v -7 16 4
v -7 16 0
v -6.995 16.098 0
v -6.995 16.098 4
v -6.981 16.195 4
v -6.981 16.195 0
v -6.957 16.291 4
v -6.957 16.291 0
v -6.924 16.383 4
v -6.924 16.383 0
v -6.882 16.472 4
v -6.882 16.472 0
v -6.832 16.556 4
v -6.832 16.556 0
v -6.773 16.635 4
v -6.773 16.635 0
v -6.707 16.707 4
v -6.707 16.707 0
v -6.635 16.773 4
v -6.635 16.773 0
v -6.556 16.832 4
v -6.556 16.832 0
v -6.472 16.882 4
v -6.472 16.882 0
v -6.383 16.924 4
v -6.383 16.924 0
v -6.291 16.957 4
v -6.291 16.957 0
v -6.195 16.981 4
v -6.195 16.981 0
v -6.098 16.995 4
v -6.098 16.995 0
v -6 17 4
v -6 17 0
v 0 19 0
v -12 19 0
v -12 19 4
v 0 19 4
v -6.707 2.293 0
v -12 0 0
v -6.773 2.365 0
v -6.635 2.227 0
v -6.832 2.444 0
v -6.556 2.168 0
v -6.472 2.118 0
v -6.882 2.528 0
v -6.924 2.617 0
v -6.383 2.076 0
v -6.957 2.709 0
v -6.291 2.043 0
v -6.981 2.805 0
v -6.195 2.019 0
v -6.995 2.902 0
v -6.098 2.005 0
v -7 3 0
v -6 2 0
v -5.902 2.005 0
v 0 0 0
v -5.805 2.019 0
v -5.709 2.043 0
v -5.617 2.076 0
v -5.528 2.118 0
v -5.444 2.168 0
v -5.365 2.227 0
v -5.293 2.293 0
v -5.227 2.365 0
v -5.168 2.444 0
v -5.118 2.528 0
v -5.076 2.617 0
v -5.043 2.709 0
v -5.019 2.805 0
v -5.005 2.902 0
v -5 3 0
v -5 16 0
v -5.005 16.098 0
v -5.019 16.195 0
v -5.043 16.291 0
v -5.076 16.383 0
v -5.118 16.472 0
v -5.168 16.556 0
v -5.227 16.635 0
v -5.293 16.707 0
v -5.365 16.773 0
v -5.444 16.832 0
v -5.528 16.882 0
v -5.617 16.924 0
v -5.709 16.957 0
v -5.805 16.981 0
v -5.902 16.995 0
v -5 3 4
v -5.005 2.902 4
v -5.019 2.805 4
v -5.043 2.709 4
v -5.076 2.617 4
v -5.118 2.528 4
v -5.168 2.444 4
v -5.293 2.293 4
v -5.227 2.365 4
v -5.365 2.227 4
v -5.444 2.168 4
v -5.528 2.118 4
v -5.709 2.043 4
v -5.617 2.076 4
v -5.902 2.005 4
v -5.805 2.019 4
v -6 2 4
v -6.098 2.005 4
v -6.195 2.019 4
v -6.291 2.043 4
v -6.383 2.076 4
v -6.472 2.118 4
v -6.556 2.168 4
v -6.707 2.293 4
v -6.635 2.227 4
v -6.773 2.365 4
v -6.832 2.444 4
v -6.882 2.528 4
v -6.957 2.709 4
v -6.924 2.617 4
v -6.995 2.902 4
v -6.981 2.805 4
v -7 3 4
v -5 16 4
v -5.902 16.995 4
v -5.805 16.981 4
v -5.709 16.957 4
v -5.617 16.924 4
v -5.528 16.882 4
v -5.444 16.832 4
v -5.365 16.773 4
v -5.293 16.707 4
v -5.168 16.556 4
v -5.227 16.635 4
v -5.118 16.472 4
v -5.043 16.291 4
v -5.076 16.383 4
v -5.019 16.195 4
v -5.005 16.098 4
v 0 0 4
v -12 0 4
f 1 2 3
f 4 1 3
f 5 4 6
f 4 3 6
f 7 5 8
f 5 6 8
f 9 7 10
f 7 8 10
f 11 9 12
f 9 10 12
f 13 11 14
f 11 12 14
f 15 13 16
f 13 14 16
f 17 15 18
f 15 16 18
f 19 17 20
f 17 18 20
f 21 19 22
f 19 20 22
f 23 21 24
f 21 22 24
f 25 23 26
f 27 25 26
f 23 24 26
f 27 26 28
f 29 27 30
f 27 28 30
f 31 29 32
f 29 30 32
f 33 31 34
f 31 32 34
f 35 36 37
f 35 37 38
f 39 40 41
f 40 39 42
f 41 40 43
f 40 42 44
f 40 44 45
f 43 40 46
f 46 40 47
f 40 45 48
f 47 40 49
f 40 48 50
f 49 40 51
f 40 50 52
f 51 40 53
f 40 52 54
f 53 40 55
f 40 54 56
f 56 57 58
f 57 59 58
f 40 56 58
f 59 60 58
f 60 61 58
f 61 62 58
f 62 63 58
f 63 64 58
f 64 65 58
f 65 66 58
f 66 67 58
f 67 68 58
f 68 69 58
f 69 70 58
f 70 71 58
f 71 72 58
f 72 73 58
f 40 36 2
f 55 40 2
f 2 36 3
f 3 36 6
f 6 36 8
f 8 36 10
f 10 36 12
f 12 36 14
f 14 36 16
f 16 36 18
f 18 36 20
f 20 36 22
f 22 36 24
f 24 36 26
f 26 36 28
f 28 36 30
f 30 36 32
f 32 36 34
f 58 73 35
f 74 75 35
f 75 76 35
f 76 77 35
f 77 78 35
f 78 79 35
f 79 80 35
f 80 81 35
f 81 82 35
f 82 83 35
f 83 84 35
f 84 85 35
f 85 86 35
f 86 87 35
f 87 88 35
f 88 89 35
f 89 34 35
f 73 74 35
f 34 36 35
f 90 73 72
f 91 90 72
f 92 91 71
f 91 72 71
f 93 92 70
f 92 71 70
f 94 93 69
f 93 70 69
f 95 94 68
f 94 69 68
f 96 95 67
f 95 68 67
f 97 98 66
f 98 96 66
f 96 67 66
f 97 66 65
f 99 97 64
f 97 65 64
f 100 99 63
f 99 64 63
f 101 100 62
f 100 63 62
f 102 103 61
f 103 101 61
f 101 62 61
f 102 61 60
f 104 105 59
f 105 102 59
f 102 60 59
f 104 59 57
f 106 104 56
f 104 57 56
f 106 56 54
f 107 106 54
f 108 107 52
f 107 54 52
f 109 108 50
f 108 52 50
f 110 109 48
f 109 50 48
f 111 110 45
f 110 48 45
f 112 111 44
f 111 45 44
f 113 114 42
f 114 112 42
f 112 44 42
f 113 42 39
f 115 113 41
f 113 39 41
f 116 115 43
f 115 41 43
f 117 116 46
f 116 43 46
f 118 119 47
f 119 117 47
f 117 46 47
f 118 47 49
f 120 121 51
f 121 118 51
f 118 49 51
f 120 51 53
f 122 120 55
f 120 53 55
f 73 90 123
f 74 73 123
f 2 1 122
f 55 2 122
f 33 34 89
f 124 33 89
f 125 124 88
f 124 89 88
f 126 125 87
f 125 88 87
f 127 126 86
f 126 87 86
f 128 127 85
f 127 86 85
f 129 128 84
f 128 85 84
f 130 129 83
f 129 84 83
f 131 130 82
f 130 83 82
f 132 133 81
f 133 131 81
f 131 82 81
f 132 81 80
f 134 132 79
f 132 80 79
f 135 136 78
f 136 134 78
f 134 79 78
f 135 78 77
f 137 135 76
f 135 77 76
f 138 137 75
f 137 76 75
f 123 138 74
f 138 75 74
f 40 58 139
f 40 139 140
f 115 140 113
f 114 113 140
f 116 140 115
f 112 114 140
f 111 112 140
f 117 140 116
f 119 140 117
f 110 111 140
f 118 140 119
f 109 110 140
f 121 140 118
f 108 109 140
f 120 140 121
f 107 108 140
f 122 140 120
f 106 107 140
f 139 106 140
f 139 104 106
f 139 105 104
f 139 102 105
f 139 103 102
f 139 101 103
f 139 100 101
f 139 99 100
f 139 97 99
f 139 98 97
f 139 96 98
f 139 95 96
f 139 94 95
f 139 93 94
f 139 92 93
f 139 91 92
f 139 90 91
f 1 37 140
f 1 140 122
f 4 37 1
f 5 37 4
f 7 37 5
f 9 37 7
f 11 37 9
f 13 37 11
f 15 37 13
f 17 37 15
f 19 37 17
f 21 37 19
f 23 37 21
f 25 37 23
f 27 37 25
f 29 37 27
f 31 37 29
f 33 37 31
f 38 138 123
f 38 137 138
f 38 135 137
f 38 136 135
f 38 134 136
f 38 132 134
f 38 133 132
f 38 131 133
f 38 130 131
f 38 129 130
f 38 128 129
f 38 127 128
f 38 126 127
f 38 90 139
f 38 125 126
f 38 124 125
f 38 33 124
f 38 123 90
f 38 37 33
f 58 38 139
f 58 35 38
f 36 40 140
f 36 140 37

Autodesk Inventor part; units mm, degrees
ref_plane "YZ Plane" through (0, 0, 0) normal (1, 0, 0) x (0, 1, 0)
ref_plane "XZ Plane" through (0, 0, 0) normal (0, 1, 0) x (-1, 0, 0)
ref_plane "XY Plane" through (0, 0, 0) normal (0, 0, 1) x (1, 0, 0)
sketch "Sketch12" plane through (0, 0, 0) normal (0, 0, 1) x (1, 0, 0)
  line L0 (0, 0) -> (-12, 0)
  line L1 (-12, 0) -> (-12, 19)
  line L2 (-12, 19) -> (0, 19)
  line L3 (0, 19) -> (0, 0)
  dimension "d50" = 12
  dimension "d51" = 19
extrude "Extrusion8" add sketch "Sketch12" along normal blind 4
sketch "Sketch13" plane through (0, 0, 4) normal (0, 0, 1) x (1, 0, 0)
  line L0 (-12, 19) -> (-12, 0) projected
  line L1 (-12, 0) -> (-7, 0)
  line L2 (-7, 0) -> (-7, 2)
  line L3 (-7, 2) -> (-12, 2)
  line L4 (-12, 2) -> (-12, 0)
  line L5 (0, 19) -> (-12, 19) projected
  line L6 (0, 19) -> (-5, 19)
  line L7 (-5, 19) -> (-5, 17)
  line L8 (-5, 17) -> (0, 17)
  line L9 (0, 17) -> (0, 19)
  line L10 (-7, 2) -> (-5, 2)
  line L11 (-5, 2) -> (-5, 17)
  line L12 (-5, 17) -> (-7, 17)
  line L13 (-7, 17) -> (-7, 2)
  point P0 (0, 0)
  dimension "d54" = 5
  dimension "d55" = 2
  dimension "d56" = 5
  dimension "d57" = 2
extrude "Extrusion9" cut sketch "Sketch13" against normal blind 4 contours L13 L12 L11 L10
fillet "Fillet9" radius 1 4 edges at (-7, 17, 2) (-5, 17, 2) (-7, 2, 2) (-5, 2, 2)
properties part number "Rod"
